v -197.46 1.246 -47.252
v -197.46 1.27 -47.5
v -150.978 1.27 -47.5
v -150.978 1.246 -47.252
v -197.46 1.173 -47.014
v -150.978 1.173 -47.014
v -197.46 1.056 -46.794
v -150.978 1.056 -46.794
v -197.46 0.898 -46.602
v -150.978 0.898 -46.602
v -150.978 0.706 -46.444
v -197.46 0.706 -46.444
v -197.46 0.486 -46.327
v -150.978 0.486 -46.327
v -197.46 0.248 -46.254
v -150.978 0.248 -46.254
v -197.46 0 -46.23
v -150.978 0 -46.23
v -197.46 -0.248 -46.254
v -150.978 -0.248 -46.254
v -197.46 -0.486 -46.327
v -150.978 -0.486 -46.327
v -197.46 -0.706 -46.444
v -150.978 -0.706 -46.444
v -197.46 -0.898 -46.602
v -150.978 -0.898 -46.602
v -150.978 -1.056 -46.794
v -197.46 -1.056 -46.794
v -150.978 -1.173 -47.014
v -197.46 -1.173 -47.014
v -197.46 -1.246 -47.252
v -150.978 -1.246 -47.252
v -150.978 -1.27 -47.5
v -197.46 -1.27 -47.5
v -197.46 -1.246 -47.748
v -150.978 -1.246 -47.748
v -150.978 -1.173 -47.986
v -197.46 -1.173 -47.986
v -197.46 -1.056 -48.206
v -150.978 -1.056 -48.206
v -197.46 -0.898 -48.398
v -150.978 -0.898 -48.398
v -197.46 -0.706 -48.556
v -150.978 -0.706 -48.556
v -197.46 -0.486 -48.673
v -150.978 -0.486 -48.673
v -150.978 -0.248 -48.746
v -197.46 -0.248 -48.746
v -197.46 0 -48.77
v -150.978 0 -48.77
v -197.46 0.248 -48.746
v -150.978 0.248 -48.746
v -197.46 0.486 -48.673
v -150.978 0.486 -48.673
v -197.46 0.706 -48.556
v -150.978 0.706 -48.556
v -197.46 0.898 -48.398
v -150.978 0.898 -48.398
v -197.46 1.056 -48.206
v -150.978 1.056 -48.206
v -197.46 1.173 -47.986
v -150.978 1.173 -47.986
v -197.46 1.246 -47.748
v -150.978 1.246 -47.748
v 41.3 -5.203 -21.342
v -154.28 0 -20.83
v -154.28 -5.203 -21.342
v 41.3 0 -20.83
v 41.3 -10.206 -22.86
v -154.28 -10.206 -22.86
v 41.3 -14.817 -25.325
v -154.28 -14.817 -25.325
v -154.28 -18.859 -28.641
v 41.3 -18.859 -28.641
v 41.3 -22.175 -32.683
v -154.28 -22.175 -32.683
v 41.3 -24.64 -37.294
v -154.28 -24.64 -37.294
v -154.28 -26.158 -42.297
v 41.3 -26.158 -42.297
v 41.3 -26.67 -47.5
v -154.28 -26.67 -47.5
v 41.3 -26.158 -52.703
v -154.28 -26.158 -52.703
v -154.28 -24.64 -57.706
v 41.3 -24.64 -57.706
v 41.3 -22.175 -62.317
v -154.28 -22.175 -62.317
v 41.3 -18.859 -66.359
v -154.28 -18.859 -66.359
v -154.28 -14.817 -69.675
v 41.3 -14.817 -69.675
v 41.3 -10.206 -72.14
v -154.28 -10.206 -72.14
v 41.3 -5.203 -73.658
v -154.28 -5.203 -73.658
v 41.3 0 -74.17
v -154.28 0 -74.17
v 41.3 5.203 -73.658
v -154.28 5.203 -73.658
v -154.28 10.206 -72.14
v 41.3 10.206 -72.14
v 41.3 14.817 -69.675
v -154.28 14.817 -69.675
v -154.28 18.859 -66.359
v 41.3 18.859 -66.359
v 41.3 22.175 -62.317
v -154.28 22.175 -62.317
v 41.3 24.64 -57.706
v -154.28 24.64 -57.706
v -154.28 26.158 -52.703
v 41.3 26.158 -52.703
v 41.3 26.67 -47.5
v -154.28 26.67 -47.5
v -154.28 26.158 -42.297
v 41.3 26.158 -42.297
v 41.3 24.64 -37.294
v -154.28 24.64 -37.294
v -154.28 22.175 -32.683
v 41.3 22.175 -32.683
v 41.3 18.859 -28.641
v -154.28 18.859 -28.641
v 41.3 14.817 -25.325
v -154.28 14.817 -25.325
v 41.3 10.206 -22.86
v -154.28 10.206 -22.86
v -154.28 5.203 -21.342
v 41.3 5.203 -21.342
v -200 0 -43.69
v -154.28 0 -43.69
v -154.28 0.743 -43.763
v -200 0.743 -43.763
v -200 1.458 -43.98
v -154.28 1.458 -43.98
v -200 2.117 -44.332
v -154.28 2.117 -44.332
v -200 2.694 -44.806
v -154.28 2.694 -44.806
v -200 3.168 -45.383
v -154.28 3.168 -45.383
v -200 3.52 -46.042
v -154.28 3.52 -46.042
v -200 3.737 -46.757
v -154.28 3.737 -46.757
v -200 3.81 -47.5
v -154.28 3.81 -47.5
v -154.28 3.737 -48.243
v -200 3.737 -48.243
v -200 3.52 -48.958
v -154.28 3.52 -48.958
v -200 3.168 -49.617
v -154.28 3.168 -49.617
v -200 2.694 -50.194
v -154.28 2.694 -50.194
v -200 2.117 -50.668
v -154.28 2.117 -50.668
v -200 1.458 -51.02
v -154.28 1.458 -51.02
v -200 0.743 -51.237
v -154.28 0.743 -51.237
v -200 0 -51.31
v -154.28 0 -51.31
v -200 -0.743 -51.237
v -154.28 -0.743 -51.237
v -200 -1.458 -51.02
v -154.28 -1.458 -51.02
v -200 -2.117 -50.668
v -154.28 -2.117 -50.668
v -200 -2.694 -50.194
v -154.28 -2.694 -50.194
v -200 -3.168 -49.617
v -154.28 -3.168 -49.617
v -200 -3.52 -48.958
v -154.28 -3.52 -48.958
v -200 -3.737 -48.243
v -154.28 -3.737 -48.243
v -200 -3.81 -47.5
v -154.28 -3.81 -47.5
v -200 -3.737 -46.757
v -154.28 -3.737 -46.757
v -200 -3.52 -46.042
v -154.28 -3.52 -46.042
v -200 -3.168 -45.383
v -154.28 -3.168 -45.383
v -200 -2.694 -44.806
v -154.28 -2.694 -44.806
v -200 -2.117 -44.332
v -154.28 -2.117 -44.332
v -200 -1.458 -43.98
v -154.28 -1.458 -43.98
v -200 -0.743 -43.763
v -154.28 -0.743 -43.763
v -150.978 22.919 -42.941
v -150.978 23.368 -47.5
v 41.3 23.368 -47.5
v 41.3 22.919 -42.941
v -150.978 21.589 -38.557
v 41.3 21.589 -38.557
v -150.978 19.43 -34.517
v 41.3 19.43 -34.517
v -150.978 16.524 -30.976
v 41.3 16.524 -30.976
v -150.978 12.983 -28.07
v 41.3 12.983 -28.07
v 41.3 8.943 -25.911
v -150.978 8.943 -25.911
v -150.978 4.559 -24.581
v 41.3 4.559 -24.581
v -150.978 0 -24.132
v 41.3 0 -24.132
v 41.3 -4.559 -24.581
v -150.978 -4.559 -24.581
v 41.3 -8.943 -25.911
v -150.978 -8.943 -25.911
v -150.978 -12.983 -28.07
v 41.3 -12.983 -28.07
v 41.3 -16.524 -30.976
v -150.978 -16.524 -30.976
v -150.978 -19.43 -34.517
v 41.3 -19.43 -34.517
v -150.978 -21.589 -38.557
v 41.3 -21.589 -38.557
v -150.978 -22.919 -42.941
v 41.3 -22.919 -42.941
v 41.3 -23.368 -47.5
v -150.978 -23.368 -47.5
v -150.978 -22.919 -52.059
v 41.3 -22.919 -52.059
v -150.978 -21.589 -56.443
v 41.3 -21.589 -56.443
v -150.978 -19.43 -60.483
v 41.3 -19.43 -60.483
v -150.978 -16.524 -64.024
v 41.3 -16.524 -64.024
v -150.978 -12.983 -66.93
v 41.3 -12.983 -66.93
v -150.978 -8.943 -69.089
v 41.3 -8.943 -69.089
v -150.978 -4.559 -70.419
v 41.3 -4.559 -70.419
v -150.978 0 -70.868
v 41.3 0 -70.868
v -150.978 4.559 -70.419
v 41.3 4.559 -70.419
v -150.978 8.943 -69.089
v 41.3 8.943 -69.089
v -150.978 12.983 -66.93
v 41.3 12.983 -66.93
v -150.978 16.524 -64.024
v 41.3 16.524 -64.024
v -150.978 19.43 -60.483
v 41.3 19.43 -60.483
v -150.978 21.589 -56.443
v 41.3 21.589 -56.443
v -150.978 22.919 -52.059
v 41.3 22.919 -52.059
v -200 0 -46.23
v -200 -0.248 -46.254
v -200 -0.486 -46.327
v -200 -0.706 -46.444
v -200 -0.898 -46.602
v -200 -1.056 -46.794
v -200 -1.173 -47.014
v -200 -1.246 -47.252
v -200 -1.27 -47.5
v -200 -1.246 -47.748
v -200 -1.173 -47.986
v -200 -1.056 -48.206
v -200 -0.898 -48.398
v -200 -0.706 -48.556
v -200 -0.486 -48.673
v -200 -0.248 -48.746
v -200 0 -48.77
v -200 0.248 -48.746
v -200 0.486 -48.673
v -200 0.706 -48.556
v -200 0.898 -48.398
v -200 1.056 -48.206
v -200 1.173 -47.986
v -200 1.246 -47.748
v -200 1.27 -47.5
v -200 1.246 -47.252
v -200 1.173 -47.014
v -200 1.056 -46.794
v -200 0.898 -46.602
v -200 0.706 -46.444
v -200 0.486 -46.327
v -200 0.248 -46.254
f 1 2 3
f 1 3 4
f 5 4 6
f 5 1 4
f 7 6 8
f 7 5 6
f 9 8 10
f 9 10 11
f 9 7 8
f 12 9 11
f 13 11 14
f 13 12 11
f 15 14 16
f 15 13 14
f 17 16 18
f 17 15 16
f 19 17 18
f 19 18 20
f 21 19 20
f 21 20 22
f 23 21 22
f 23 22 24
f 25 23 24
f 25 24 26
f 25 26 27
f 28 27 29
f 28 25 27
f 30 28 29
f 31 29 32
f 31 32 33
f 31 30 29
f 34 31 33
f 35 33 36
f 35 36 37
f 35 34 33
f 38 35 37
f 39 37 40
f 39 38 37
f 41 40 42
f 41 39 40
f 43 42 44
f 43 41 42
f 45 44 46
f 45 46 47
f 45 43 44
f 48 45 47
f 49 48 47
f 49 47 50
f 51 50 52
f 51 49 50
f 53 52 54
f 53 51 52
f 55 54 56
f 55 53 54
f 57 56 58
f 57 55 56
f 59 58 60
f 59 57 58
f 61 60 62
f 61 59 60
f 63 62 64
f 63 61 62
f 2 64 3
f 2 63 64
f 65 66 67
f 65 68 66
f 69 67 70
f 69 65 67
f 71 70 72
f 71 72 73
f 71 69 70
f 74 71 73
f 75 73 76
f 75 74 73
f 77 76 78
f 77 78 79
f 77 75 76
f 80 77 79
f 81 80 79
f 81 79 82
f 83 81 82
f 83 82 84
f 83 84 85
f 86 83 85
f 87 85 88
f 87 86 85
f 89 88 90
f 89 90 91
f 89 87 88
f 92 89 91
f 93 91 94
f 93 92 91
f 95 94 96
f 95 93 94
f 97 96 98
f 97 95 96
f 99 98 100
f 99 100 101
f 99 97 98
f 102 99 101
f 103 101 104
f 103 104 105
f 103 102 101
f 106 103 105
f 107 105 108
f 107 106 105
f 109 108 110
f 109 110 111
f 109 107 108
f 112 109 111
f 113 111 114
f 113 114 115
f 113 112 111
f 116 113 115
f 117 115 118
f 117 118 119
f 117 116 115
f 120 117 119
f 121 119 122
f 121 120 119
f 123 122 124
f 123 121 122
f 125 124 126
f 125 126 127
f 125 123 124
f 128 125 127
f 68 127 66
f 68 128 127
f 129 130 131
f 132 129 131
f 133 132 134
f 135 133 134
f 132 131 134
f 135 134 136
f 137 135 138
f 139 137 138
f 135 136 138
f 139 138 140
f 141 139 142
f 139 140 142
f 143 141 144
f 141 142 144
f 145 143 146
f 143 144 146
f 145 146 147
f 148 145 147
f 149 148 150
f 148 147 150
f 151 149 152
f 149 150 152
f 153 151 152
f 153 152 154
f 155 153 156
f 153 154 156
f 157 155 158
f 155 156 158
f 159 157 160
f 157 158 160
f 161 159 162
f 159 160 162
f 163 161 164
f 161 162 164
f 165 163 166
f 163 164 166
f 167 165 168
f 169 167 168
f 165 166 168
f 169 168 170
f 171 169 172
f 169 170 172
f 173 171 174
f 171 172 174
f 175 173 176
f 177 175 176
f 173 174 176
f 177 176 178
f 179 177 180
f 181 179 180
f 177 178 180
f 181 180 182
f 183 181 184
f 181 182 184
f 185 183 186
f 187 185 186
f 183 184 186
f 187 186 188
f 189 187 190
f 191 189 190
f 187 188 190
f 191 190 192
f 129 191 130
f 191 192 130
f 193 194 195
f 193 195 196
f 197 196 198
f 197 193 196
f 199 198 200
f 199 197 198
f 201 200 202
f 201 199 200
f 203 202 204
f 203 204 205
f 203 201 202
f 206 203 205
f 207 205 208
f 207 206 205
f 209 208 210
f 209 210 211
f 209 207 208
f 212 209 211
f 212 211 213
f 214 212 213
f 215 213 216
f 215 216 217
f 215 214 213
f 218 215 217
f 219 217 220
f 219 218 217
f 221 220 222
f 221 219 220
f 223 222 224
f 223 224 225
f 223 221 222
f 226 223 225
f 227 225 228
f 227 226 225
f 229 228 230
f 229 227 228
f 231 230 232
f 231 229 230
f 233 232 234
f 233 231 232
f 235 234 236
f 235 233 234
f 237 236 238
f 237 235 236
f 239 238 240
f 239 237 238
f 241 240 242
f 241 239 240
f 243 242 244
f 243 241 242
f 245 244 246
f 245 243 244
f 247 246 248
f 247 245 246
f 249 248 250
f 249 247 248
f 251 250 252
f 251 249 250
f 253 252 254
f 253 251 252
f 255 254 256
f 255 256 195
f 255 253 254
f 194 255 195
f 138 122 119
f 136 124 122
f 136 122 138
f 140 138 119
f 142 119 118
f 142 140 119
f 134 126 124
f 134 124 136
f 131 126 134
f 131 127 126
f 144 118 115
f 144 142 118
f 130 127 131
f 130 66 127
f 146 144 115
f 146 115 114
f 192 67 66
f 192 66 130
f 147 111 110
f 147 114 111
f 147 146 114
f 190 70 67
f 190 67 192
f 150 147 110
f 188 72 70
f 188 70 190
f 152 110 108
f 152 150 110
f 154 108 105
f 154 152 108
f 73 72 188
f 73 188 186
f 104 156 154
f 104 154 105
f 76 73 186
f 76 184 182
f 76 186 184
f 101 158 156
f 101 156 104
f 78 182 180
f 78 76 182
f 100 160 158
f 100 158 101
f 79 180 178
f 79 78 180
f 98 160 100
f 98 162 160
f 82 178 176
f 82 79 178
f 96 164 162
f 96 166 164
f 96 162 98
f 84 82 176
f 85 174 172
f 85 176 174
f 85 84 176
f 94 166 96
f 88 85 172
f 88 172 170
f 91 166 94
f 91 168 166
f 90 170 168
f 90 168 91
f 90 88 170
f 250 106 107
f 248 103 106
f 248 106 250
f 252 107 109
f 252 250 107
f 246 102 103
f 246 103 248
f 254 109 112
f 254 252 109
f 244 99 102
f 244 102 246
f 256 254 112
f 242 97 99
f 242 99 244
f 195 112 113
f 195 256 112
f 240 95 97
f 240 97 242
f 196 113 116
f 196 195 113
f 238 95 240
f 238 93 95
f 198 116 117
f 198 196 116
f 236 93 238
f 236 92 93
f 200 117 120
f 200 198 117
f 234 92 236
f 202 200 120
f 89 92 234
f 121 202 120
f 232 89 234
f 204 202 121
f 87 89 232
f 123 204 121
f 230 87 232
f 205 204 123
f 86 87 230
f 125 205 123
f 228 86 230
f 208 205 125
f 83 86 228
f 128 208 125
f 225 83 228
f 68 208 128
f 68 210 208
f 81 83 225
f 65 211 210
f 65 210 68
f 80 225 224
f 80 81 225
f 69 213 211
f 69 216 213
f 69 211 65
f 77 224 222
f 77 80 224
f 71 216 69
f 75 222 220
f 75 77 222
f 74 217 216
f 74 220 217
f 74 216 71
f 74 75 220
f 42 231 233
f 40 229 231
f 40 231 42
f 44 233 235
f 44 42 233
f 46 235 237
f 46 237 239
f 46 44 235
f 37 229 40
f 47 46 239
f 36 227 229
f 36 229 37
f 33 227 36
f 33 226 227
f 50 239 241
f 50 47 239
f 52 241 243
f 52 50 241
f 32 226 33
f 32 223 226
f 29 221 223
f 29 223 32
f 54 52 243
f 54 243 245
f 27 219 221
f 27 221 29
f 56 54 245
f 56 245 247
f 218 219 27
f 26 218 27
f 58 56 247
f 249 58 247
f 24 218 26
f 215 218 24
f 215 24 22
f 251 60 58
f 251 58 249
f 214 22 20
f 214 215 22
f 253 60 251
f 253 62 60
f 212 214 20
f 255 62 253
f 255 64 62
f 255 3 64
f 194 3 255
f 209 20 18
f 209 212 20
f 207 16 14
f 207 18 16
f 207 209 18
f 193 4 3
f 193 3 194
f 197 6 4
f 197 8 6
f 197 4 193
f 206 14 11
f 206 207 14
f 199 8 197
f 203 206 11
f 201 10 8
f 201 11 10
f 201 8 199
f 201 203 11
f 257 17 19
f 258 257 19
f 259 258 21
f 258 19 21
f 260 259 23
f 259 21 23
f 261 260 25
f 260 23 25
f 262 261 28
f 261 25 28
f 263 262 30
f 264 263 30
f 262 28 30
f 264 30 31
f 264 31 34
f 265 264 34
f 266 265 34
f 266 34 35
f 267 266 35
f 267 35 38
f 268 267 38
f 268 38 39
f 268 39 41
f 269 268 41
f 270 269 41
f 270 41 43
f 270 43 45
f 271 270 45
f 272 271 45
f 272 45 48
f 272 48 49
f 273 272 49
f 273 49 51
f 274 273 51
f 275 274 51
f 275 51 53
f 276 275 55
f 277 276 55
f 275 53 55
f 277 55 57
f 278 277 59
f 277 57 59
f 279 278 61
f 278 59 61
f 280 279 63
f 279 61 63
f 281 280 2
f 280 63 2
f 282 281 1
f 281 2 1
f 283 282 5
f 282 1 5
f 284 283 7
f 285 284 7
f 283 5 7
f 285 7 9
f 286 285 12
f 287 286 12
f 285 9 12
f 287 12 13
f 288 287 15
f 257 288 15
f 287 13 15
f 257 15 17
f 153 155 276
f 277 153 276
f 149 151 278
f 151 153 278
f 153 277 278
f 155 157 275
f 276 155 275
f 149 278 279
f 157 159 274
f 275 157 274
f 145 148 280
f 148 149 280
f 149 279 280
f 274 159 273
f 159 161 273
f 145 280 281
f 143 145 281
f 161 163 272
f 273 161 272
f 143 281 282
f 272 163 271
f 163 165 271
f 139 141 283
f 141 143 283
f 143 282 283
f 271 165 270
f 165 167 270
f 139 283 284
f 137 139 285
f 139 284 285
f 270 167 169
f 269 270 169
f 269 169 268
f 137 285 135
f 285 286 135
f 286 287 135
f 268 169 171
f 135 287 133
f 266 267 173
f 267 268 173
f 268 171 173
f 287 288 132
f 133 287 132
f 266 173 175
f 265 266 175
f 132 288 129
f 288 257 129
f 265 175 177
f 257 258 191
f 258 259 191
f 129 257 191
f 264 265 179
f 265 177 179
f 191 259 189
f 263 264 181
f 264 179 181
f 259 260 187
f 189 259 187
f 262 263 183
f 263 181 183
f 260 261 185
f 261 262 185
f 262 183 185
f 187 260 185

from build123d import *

# Parameters (mm, degrees)
SWEEP1_PROFILE_R   = 26.67
CUT_EXTRUDE1_START = -45.72
SKETCH2_R          = 26.67
SKETCH2_R_2        = 3.81
CUT_EXTRUDE1_DEPTH = 45.72
SHELL1_START       = -150.978
SHELL1_OUTLINE_R   = 23.368
SHELL1_DEPTH       = 192.278
SHELL1_START_2     = -197.46
SHELL1_2_OUTLINE_R = 1.27
SHELL1_2_DEPTH     = 46.482
SKETCH3_R          = 1.27
CUT_EXTRUDE2_DEPTH = 252.433520836


# Read off the part's stored shape, not the designer's step: Shell1
with BuildPart() as part:
    # Sweep1: sweep along a path in Sketch1
    with BuildLine(Plane(origin=(0, 0, 0), x_dir=(1, 0, 0), z_dir=(0, 1, 0))) as sweep1_path:
        Line((-200, 47.5), (41.3, 47.5))
    # Sweep1 profile (on start of the path) → Sweep1 (sweep)
    with BuildSketch(Plane(origin=(-200, 0, -47.5), x_dir=(0, 0, 1), z_dir=(1, 0, 0))):
        Circle(SWEEP1_PROFILE_R)
    sweep(path=sweep1_path.line)

    # Sketch2 → Cut-Extrude1 (cut)
    with BuildSketch(Plane.ZY.offset(200).offset(CUT_EXTRUDE1_START)):
        with Locations(Location((-47.5, 0, 0), (0, 0, 180))):
            Circle(SKETCH2_R)
        with Locations((-47.5, 0)):
            Circle(SKETCH2_R_2, mode=Mode.SUBTRACT)
    extrude(amount=CUT_EXTRUDE1_DEPTH, mode=Mode.SUBTRACT)

    # Shell1 outline → Shell1 (cut)
    with BuildSketch(Plane.YZ.offset(SHELL1_START)):
        with Locations((0, -47.5)):
            Circle(SHELL1_OUTLINE_R)
    extrude(amount=SHELL1_DEPTH, mode=Mode.SUBTRACT)

    # Shell1 2 outline → Shell1 2 (cut)
    with BuildSketch(Plane.YZ.offset(SHELL1_START_2)):
        with Locations((0, -47.5)):
            Circle(SHELL1_2_OUTLINE_R)
    extrude(amount=SHELL1_2_DEPTH, mode=Mode.SUBTRACT)

    # Sketch3 → Cut-Extrude2 (cut, through all)
    with BuildSketch(Plane(origin=(-197.46, 0, 0), x_dir=(0, 0, -1), z_dir=(1, 0, 0))):
        with Locations(Location((47.5, 0, 0), (0, 0, 180))):
            Circle(SKETCH3_R)
    extrude(amount=-CUT_EXTRUDE2_DEPTH, mode=Mode.SUBTRACT)


solid = part.part
